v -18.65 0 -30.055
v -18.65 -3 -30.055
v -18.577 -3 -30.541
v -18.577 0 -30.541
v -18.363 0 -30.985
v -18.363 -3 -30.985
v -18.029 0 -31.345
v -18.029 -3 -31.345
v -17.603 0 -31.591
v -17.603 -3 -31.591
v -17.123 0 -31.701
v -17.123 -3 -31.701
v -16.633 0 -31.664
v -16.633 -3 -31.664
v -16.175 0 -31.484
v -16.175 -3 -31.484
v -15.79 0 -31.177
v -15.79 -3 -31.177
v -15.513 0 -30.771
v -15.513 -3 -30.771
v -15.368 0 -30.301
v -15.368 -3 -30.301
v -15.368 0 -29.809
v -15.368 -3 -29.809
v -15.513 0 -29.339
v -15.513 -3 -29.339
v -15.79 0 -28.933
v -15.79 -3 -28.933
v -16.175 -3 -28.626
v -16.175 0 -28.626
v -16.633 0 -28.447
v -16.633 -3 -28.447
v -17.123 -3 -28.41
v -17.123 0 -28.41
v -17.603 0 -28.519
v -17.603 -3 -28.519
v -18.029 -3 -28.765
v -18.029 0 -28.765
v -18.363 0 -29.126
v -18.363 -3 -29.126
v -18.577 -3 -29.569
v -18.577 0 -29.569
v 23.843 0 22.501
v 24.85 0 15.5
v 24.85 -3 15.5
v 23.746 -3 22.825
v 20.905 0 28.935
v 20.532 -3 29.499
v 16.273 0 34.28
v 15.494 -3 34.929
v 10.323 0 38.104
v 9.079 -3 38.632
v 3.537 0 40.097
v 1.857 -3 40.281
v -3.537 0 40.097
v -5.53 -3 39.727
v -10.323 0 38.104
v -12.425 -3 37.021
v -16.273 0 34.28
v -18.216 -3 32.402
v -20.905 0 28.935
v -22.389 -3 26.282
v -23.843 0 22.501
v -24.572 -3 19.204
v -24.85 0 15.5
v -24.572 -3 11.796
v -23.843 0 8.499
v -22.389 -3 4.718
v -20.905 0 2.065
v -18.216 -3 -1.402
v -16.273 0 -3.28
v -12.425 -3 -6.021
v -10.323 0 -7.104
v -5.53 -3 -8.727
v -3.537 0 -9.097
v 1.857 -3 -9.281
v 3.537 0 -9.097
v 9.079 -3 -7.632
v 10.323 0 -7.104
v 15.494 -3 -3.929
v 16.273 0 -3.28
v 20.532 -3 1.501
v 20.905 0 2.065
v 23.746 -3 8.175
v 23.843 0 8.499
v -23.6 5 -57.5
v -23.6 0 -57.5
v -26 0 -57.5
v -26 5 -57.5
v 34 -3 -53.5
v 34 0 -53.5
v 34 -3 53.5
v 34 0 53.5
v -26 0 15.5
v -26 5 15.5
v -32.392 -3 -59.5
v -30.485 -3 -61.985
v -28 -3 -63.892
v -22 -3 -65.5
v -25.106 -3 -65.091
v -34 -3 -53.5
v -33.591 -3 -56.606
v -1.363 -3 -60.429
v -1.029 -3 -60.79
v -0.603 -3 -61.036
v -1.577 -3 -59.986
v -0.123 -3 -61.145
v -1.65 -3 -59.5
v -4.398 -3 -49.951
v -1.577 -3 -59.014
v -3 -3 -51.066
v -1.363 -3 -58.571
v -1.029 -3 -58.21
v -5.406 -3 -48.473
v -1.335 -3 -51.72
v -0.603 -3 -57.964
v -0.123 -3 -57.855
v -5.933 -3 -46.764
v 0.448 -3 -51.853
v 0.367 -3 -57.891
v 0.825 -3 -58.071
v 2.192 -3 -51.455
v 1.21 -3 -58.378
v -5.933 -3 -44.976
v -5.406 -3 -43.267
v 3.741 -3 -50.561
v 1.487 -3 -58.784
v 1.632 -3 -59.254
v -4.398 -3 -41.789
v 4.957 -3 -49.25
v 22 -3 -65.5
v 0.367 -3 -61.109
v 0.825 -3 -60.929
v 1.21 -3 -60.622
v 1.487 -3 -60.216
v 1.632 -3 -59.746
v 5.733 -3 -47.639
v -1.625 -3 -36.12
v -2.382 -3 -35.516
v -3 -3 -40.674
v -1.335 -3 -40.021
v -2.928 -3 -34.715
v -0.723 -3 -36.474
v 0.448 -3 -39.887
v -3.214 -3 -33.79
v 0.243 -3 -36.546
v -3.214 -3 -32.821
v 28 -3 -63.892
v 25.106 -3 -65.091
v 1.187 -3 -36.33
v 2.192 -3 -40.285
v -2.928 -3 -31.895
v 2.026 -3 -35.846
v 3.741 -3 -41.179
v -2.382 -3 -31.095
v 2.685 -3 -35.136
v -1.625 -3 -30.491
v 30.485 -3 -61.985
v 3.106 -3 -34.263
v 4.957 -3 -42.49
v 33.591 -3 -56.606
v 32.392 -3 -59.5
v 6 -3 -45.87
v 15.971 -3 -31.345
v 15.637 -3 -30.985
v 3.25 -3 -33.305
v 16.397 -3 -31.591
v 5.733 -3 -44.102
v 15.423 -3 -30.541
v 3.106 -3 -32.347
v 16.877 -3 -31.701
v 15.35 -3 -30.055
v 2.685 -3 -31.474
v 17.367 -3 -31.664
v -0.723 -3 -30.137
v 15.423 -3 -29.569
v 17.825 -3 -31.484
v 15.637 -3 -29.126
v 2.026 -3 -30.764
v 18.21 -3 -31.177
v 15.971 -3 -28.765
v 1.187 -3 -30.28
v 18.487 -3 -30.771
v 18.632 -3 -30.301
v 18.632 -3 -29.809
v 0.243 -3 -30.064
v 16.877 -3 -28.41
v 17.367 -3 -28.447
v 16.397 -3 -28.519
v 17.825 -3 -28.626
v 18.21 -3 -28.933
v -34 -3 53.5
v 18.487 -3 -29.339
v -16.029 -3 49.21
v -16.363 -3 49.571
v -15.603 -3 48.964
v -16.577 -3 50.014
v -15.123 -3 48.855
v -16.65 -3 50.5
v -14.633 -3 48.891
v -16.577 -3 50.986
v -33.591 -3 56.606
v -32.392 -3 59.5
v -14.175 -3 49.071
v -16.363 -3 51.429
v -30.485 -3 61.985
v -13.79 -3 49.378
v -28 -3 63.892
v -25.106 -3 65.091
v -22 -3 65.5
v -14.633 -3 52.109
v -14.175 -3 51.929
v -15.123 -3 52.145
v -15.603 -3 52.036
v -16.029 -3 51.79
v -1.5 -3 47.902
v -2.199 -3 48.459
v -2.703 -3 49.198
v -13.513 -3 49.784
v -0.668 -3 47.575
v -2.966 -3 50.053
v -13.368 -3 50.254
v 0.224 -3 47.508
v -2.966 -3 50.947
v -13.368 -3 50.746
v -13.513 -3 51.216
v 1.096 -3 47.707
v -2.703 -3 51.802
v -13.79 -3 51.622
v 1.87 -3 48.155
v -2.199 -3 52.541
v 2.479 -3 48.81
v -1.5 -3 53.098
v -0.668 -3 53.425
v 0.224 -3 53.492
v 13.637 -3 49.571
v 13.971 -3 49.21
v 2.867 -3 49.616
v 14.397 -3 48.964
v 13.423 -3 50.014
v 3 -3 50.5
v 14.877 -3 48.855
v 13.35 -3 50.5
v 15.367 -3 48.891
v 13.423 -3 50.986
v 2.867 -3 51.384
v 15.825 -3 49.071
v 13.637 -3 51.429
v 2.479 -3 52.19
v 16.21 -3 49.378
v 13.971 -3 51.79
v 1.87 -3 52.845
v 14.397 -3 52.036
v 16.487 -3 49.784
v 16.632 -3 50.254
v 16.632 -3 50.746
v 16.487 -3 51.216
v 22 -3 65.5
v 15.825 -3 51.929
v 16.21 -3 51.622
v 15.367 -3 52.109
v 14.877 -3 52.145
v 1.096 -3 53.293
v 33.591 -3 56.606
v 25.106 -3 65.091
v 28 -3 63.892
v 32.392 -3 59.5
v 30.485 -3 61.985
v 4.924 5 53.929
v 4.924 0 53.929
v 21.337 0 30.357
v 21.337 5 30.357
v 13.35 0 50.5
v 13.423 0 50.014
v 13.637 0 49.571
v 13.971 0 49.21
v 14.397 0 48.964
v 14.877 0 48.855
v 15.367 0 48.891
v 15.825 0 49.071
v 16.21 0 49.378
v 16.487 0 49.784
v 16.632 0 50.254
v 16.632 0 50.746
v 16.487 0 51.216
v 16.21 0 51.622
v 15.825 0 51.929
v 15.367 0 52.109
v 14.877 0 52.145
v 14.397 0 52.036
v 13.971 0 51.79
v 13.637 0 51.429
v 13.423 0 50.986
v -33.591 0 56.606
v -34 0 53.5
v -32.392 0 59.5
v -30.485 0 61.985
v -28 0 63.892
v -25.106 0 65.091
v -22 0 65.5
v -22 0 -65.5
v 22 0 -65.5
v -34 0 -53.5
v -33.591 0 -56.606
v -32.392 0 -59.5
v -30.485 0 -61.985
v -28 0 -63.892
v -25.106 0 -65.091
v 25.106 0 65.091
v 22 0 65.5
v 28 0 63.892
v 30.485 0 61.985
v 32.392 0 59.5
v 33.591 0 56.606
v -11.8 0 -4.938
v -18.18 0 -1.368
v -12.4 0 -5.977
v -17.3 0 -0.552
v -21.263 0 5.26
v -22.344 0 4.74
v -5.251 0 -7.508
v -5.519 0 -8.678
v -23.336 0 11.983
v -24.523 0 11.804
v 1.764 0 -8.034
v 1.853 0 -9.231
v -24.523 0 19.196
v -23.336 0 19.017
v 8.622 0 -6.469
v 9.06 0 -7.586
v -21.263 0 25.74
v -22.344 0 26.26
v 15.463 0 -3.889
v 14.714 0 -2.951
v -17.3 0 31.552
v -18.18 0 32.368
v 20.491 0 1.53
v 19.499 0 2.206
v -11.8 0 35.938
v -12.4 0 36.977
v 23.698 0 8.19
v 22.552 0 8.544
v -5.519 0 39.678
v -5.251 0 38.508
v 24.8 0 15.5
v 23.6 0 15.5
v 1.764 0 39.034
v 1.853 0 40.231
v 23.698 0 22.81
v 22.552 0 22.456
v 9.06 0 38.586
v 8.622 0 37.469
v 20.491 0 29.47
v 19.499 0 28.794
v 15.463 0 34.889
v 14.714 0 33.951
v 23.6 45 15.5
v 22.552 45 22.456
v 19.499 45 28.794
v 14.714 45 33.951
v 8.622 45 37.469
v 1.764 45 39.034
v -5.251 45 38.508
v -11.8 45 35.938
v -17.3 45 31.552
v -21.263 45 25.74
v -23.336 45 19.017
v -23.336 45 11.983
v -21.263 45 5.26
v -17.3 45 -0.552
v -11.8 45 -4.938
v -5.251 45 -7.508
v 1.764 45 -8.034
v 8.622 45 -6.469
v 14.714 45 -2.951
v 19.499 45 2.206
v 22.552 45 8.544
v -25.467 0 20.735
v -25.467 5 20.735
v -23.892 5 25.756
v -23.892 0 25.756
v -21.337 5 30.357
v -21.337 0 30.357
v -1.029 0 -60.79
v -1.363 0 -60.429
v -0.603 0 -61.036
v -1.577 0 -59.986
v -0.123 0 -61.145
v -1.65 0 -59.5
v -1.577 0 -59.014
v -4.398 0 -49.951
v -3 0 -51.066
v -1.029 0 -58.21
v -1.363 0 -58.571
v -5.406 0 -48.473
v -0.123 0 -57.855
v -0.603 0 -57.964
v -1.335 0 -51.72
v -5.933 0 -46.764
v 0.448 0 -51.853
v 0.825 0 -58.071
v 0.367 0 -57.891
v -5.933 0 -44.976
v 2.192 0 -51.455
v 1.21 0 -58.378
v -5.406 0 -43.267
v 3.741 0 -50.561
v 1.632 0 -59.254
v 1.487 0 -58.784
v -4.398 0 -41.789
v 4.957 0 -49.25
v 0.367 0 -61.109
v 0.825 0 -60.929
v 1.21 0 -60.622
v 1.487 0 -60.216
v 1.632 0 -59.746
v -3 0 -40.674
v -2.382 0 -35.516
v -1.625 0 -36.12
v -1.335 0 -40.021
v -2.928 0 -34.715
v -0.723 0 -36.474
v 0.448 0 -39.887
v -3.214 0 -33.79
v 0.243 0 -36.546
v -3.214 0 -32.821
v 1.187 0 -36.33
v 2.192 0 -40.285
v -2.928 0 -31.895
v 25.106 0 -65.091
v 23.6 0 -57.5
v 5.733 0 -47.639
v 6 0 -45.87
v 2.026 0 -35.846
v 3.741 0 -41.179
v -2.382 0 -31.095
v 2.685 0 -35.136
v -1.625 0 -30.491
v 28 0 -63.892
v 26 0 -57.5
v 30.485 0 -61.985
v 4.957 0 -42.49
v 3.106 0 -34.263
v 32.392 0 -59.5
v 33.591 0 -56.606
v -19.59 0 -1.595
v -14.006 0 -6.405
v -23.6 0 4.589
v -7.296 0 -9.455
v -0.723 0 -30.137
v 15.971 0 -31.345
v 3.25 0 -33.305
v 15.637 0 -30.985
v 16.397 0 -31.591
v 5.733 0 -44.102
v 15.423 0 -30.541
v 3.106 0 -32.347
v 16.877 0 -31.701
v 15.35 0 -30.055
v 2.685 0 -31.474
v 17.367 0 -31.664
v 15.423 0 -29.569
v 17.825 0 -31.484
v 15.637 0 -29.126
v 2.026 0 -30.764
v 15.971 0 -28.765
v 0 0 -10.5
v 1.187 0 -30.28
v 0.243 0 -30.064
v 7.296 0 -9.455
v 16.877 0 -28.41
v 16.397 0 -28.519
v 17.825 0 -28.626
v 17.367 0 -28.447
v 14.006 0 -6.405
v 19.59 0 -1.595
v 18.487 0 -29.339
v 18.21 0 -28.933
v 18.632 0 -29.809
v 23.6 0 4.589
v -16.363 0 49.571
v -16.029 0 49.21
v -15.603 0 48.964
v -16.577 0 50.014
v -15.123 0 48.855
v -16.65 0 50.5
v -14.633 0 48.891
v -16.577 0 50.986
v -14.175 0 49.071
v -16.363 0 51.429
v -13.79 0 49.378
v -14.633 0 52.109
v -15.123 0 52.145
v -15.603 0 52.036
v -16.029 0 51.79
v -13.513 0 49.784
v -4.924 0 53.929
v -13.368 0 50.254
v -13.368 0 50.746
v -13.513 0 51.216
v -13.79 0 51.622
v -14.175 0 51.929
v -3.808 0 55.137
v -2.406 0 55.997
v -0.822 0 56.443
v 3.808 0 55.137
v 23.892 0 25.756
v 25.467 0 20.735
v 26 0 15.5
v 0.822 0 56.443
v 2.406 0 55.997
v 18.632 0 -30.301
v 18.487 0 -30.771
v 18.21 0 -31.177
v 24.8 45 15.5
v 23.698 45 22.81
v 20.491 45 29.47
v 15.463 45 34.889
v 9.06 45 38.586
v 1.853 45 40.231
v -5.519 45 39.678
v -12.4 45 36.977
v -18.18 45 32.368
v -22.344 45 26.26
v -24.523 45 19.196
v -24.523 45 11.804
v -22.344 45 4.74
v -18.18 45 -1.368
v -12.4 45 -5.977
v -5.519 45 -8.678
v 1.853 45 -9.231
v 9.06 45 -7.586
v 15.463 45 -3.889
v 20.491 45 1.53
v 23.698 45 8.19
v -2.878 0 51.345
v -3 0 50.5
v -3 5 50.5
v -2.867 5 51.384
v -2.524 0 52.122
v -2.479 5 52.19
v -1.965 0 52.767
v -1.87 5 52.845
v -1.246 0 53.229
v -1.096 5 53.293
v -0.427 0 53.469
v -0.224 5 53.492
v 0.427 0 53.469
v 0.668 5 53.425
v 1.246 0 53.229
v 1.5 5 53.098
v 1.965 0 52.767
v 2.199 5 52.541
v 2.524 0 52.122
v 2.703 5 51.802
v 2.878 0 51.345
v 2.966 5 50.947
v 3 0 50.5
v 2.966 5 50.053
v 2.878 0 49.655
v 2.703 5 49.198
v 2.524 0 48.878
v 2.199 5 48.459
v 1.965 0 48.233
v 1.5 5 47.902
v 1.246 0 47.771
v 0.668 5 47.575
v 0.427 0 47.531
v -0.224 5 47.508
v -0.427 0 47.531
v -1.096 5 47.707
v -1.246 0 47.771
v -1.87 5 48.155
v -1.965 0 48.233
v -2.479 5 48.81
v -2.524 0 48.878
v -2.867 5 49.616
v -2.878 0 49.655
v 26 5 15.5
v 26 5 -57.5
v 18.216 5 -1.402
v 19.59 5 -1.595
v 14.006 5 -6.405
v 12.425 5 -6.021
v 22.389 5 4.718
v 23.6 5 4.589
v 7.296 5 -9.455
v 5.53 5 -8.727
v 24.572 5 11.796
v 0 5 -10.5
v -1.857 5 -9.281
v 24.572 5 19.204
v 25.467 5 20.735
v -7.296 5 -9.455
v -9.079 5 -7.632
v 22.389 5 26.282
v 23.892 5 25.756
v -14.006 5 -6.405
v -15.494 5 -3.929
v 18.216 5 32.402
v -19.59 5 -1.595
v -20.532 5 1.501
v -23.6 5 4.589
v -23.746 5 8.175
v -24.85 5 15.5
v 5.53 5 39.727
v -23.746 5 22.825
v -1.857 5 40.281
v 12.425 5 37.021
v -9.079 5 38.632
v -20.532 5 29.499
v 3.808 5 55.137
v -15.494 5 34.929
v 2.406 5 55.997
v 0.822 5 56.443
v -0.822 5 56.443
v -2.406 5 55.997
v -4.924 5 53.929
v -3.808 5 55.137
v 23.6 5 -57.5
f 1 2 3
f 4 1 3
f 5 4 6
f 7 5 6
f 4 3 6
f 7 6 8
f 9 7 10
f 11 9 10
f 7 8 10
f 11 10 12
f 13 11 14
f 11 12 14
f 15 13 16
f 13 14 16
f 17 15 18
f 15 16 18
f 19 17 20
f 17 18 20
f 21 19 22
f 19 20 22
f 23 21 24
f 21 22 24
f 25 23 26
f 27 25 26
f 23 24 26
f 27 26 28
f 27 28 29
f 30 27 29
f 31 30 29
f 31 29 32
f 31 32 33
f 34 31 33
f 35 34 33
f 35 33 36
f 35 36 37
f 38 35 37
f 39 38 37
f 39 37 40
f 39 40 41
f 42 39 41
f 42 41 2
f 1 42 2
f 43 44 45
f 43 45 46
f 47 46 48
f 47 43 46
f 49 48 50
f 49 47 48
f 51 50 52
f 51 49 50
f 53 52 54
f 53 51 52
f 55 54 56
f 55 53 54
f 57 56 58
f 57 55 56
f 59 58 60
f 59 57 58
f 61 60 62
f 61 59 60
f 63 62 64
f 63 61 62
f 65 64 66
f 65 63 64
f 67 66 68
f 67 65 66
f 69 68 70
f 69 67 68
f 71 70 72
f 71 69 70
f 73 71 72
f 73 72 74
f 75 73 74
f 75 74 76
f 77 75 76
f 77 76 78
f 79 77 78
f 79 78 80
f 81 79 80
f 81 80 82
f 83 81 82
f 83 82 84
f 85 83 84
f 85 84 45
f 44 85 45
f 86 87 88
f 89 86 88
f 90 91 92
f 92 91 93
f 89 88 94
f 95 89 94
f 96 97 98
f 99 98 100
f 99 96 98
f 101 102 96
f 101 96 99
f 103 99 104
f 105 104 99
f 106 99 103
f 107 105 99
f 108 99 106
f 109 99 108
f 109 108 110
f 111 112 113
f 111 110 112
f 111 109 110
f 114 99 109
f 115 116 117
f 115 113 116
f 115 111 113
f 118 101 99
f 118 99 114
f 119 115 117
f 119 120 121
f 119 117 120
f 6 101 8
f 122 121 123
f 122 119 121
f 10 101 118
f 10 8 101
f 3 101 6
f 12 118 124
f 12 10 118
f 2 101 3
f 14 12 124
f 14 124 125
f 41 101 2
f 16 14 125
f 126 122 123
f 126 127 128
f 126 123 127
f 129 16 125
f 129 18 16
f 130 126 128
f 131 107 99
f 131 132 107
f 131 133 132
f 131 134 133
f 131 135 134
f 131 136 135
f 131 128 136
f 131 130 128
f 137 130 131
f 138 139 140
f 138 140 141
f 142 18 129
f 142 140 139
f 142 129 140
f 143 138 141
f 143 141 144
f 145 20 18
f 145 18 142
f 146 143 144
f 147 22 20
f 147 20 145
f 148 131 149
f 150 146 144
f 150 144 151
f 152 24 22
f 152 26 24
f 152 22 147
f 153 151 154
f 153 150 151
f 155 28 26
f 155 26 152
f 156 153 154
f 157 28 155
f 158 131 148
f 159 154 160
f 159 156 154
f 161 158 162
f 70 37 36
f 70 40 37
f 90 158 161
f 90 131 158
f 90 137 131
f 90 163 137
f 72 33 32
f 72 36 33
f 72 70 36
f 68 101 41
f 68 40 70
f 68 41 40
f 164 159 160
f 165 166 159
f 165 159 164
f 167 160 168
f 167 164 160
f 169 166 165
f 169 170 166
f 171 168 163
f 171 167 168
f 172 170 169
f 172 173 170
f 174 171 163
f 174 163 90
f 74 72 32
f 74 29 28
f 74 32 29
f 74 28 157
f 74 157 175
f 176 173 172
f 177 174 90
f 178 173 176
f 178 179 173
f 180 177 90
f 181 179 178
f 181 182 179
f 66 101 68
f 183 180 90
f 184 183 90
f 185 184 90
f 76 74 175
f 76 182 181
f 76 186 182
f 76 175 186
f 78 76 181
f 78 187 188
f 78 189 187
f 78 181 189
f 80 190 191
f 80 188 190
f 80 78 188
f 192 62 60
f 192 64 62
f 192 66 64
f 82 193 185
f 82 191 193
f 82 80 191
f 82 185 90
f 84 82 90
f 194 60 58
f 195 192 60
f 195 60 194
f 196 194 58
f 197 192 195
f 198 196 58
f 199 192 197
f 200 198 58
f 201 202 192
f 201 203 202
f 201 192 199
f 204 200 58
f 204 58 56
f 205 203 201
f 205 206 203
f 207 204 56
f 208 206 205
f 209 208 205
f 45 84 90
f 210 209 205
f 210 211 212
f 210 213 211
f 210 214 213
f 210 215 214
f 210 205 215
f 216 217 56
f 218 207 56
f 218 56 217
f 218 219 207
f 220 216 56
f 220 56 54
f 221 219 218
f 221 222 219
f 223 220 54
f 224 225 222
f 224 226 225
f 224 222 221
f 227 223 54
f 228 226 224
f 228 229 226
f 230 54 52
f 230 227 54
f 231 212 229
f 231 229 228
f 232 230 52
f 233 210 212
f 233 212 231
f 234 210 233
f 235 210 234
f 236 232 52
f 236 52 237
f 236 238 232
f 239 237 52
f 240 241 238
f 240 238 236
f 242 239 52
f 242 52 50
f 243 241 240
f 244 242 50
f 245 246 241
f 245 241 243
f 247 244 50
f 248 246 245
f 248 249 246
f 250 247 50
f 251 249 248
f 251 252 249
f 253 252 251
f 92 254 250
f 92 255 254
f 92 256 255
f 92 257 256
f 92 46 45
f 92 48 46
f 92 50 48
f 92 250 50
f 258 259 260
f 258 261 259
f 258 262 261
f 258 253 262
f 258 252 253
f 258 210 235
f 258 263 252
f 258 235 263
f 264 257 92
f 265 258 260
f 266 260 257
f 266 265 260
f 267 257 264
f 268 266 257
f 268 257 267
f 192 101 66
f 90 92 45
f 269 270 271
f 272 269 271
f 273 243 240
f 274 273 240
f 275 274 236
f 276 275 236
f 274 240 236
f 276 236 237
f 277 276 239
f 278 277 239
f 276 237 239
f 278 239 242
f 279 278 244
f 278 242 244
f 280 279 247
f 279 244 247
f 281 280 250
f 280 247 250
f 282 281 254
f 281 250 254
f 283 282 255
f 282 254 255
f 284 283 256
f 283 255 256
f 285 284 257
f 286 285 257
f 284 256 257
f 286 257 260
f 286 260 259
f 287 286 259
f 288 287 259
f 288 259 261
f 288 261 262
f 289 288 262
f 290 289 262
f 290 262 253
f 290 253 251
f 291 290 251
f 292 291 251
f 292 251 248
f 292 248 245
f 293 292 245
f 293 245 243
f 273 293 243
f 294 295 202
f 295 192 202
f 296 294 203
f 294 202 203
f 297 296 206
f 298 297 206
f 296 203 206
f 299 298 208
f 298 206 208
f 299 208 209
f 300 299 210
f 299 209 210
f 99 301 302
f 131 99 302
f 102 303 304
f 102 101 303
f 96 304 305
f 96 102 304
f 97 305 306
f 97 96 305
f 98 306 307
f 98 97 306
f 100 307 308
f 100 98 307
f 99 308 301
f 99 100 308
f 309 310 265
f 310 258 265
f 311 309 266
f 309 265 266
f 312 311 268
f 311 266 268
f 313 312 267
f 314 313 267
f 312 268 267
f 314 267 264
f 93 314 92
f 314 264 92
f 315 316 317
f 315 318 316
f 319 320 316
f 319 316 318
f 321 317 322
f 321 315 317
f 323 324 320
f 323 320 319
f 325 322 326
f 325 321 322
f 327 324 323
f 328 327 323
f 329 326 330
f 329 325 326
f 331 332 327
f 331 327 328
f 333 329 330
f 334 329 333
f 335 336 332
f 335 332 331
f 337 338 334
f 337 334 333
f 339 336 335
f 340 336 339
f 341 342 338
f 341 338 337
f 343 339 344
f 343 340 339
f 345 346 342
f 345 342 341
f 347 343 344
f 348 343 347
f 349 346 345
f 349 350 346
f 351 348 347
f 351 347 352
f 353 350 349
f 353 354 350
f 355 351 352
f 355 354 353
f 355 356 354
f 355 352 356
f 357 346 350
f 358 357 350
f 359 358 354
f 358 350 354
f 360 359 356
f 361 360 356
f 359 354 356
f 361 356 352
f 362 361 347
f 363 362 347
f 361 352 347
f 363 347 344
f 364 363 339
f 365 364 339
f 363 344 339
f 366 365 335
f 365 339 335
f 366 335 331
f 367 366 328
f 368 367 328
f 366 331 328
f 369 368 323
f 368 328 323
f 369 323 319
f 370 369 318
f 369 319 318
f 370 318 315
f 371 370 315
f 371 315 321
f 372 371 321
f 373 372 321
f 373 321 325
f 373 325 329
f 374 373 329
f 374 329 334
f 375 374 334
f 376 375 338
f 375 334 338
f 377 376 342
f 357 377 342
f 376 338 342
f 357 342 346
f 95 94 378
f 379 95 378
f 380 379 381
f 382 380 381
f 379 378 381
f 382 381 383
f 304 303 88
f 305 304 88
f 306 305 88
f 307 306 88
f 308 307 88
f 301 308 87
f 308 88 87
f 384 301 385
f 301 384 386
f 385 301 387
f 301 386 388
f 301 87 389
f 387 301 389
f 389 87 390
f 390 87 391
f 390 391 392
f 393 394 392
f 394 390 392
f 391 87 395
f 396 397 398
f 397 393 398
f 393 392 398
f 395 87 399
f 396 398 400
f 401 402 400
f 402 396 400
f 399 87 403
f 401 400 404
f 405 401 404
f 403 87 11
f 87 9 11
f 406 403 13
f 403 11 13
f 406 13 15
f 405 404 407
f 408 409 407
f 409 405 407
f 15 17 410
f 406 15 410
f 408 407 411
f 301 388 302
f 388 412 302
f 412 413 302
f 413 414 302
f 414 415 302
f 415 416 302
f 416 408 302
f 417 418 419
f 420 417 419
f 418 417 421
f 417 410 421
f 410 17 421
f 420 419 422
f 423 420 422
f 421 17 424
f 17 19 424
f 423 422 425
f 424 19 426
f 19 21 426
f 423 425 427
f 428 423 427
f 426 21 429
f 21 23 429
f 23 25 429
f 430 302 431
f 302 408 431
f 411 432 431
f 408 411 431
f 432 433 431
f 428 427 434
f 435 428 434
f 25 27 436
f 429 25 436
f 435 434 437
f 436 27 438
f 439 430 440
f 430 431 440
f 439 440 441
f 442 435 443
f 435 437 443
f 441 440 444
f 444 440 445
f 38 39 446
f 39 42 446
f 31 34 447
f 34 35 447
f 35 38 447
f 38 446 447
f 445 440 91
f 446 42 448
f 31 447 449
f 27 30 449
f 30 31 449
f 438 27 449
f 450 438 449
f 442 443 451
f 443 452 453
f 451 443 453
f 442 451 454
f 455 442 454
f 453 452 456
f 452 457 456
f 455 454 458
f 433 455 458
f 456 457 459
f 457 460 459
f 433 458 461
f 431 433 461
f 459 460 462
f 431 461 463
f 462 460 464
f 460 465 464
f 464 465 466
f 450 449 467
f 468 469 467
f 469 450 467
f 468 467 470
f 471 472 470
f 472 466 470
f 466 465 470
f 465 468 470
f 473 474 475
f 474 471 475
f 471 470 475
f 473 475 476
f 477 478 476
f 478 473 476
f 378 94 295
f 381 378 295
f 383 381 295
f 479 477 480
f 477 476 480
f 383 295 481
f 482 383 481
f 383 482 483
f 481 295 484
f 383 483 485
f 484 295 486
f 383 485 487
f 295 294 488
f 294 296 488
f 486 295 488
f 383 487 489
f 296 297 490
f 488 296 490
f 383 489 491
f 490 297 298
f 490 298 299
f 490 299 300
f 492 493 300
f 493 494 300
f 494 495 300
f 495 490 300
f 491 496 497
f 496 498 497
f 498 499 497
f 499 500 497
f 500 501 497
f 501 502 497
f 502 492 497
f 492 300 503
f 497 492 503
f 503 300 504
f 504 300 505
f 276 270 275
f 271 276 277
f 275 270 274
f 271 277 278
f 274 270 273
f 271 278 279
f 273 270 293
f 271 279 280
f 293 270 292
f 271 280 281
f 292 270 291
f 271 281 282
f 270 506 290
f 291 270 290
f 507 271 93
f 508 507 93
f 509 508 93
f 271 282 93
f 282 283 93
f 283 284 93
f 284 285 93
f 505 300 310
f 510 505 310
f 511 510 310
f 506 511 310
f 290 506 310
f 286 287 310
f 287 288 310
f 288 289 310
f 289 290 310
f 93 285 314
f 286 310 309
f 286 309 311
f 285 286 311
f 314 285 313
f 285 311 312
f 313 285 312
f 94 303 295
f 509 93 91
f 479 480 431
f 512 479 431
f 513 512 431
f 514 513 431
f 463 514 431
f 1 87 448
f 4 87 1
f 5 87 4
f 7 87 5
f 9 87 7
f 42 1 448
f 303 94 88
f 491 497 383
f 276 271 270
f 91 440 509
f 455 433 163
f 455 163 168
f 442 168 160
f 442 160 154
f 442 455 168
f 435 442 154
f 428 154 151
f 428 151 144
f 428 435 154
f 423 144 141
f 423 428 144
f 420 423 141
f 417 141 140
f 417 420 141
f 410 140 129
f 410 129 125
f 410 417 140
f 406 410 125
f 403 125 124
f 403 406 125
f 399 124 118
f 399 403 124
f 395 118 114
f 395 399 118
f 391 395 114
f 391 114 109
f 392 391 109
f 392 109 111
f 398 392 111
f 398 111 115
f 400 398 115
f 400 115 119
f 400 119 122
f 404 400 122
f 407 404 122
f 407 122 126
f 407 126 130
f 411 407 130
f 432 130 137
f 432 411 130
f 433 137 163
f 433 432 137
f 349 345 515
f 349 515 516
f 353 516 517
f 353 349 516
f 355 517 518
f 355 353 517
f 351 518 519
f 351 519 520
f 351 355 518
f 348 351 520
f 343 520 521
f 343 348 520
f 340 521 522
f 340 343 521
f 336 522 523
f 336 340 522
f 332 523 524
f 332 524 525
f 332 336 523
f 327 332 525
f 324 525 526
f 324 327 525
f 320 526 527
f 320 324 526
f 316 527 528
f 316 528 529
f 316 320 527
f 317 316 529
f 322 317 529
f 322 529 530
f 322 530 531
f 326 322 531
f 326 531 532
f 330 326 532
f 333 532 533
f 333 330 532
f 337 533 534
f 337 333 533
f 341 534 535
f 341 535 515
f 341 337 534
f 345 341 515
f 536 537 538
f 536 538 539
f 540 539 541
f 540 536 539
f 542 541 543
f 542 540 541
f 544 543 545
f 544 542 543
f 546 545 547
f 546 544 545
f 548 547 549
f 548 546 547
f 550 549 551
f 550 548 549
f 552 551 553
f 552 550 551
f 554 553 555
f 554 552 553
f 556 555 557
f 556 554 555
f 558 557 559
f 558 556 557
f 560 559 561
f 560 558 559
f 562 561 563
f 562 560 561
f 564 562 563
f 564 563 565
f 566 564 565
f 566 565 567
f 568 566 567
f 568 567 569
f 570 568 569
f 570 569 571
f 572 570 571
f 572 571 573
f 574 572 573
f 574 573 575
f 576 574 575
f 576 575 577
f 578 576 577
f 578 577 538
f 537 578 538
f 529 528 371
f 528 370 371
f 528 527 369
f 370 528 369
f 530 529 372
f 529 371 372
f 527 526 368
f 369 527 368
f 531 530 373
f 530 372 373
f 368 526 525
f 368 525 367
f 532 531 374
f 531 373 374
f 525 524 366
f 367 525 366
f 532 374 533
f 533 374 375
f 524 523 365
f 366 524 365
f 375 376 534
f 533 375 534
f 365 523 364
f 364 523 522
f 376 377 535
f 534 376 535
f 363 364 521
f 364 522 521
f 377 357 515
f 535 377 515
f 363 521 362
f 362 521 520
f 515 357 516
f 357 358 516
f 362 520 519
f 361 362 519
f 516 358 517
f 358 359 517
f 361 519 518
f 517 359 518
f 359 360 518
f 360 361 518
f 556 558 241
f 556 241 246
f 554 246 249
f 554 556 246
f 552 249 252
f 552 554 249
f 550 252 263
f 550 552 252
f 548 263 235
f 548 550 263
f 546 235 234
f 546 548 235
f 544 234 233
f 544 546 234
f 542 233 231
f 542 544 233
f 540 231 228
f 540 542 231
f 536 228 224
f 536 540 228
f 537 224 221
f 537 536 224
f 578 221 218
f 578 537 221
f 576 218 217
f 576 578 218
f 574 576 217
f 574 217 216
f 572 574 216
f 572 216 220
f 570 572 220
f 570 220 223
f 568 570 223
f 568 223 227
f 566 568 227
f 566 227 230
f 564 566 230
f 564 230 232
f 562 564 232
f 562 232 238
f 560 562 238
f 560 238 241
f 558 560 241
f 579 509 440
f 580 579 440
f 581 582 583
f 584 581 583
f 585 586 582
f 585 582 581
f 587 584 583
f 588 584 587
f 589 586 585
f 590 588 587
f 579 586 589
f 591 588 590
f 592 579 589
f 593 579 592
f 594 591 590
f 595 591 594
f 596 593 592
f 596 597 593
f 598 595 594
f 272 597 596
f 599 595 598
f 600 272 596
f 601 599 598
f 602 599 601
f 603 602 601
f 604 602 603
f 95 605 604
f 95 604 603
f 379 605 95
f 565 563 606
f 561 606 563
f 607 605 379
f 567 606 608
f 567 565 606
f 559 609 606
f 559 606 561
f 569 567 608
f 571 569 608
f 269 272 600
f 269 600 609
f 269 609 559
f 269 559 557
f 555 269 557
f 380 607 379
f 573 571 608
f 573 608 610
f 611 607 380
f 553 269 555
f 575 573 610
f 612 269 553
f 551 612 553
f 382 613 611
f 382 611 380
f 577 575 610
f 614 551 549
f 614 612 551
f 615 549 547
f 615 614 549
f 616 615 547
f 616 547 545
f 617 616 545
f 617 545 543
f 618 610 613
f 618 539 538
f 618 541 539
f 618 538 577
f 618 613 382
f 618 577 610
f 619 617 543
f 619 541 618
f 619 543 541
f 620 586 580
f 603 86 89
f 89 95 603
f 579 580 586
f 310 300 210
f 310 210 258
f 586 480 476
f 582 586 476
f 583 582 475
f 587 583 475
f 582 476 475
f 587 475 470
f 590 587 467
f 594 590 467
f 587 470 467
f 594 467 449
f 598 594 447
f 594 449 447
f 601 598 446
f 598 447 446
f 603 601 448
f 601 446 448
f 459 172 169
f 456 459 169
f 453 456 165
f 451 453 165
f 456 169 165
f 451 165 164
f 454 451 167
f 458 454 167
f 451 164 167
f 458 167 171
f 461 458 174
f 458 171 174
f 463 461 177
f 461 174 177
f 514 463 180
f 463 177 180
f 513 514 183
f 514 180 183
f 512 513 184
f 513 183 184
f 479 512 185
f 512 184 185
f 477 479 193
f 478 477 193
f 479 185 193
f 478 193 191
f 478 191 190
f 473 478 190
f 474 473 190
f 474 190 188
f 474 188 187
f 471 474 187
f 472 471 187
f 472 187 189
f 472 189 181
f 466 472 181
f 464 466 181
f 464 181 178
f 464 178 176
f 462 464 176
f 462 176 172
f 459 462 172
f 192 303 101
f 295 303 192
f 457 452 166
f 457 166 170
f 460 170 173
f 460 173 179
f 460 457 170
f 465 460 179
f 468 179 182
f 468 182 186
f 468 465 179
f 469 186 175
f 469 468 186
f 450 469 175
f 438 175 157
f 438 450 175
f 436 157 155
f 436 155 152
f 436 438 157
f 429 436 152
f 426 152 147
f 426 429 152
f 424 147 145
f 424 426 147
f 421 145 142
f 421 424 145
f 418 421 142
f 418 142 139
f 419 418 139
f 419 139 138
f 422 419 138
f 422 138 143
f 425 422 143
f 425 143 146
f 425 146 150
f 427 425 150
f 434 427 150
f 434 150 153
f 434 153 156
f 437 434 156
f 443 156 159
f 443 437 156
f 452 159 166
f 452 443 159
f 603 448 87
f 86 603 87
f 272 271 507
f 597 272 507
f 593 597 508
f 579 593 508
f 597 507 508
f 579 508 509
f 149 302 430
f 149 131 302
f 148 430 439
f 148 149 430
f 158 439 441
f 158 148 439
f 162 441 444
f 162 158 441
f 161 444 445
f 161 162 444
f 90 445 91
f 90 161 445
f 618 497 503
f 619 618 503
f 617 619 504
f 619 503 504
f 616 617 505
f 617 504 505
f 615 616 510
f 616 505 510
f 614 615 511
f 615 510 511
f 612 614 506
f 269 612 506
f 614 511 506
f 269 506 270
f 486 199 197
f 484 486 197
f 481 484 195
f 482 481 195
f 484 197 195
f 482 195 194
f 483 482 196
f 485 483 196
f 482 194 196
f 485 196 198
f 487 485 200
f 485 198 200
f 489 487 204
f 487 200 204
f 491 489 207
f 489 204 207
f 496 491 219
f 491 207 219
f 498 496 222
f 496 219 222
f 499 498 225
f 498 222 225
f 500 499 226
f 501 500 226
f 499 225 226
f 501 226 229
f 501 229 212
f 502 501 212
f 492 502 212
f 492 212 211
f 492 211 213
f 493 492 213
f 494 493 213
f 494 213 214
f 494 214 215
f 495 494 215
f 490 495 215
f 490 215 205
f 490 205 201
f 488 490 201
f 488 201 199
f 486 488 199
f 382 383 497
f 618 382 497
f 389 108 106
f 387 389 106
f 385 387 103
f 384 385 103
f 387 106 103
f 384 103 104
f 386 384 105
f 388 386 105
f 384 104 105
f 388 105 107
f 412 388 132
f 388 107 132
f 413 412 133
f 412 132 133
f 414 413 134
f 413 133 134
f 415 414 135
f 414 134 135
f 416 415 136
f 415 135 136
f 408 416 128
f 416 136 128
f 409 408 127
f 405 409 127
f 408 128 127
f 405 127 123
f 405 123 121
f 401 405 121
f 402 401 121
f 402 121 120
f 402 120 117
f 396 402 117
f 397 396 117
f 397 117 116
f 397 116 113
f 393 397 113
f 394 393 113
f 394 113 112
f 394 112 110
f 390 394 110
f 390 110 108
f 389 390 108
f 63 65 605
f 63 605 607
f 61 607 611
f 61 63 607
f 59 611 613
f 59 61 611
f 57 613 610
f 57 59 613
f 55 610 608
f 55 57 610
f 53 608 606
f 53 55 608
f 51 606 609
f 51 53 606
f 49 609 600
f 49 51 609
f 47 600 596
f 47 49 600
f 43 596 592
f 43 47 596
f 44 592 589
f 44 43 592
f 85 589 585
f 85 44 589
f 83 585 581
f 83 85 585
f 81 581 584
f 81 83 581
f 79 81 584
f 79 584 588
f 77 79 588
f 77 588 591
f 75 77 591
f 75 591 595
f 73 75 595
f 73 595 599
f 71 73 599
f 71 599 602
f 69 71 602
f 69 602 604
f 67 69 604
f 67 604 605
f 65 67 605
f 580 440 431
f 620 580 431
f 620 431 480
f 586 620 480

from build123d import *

# Parameters (mm, degrees)
F0_W     = 68
F0_H     = 131
F0_R     = 6
F0_R_2   = 3.25
F0_R_3   = 24.85
F0_R_4   = 3
F1_DEPTH = 3
F2_R     = 24.85
F2_R_2   = 3
F3_DEPTH = 5
F4_D     = 3.3
F5_R     = 12
F6_R     = 24.8
F6_R_2   = 23.6
F7_DEPTH = 45


with BuildPart() as f1:
    # F0 (on Front) → F1 (new body)
    with BuildSketch(Plane.XZ):
        Rectangle(F0_W, F0_H)
        with Locations((0, -45.8700908476)):
            Circle(F0_R, mode=Mode.SUBTRACT)
        with Locations((0, -33.3051362713)):
            Circle(F0_R_2, mode=Mode.SUBTRACT)
        with Locations((0, 15.5)):
            Circle(F0_R_3, mode=Mode.SUBTRACT)
        with Locations((0, 50.5)):
            Circle(F0_R_4, mode=Mode.SUBTRACT)
    extrude(amount=F1_DEPTH)

    # F2 (on face) → F3 (join)
    with BuildSketch(Plane(origin=(0, 0, 0), x_dir=(-1, 0, 0), z_dir=(0, 1, 0))):
        with BuildLine():
            Line((-23.6, -57.5), (-23.6, 4.5894546424))
            ThreePointArc((-23.6, 4.5894546424), (0, -10.5), (23.6, 4.5894546424))
            Line((23.6, 4.5894546424), (23.6, -57.5))
            Line((23.6, -57.5), (26, -57.5))
            Line((26, -57.5), (26, 15.5))
            ThreePointArc((26, 15.5), (24.8068601529, 23.2858647145), (21.3369469729, 30.3571428571))
            Line((21.3369469729, 30.3571428571), (4.9239108399, 53.9285714286))
            ThreePointArc((4.9239108399, 53.9285714286), (0, 56.5), (-4.9239108399, 53.9285714286))
            Line((-4.9239108399, 53.9285714286), (-21.3369469729, 30.3571428571))
            ThreePointArc((-21.3369469729, 30.3571428571), (-24.8068601529, 23.2858647145), (-26, 15.5))
            Line((-26, 15.5), (-26, -57.5))
            Line((-26, -57.5), (-23.6, -57.5))
        make_face()
        with Locations((0, 15.5)):
            Circle(F2_R, mode=Mode.SUBTRACT)
        with Locations((0, 50.5)):
            Circle(F2_R_2, mode=Mode.SUBTRACT)
    extrude(amount=F3_DEPTH)

    # F4 (through all)
    with Locations(Plane(origin=(0, 0, 0), x_dir=(1, 0, 0), z_dir=(0, 1, 0))):
        with Locations((-15, -50.5), (15, -50.5), (-17, 30.0551362713), (17, 30.0551362713), (0, 59.5)):
            Hole(F4_D / 2)

    # F5
    f5_edges = [f1.edges().sort_by_distance(p)[0] for p in [
        (-34, -1.5, 65.5),
        (34, -1.5, 65.5),
        (-34, -1.5, -65.5),
        (34, -1.5, -65.5),
    ]]
    fillet(f5_edges, radius=F5_R)


with BuildPart() as f7:
    # F6 (on Front) → F7 (new body)
    with BuildSketch(Plane.XZ):
        with Locations((0, 15.5)):
            Circle(F6_R)
        with Locations((0, 15.5)):
            Circle(F6_R_2, mode=Mode.SUBTRACT)
    extrude(amount=-F7_DEPTH)


solid = Compound([f1.part, f7.part])
